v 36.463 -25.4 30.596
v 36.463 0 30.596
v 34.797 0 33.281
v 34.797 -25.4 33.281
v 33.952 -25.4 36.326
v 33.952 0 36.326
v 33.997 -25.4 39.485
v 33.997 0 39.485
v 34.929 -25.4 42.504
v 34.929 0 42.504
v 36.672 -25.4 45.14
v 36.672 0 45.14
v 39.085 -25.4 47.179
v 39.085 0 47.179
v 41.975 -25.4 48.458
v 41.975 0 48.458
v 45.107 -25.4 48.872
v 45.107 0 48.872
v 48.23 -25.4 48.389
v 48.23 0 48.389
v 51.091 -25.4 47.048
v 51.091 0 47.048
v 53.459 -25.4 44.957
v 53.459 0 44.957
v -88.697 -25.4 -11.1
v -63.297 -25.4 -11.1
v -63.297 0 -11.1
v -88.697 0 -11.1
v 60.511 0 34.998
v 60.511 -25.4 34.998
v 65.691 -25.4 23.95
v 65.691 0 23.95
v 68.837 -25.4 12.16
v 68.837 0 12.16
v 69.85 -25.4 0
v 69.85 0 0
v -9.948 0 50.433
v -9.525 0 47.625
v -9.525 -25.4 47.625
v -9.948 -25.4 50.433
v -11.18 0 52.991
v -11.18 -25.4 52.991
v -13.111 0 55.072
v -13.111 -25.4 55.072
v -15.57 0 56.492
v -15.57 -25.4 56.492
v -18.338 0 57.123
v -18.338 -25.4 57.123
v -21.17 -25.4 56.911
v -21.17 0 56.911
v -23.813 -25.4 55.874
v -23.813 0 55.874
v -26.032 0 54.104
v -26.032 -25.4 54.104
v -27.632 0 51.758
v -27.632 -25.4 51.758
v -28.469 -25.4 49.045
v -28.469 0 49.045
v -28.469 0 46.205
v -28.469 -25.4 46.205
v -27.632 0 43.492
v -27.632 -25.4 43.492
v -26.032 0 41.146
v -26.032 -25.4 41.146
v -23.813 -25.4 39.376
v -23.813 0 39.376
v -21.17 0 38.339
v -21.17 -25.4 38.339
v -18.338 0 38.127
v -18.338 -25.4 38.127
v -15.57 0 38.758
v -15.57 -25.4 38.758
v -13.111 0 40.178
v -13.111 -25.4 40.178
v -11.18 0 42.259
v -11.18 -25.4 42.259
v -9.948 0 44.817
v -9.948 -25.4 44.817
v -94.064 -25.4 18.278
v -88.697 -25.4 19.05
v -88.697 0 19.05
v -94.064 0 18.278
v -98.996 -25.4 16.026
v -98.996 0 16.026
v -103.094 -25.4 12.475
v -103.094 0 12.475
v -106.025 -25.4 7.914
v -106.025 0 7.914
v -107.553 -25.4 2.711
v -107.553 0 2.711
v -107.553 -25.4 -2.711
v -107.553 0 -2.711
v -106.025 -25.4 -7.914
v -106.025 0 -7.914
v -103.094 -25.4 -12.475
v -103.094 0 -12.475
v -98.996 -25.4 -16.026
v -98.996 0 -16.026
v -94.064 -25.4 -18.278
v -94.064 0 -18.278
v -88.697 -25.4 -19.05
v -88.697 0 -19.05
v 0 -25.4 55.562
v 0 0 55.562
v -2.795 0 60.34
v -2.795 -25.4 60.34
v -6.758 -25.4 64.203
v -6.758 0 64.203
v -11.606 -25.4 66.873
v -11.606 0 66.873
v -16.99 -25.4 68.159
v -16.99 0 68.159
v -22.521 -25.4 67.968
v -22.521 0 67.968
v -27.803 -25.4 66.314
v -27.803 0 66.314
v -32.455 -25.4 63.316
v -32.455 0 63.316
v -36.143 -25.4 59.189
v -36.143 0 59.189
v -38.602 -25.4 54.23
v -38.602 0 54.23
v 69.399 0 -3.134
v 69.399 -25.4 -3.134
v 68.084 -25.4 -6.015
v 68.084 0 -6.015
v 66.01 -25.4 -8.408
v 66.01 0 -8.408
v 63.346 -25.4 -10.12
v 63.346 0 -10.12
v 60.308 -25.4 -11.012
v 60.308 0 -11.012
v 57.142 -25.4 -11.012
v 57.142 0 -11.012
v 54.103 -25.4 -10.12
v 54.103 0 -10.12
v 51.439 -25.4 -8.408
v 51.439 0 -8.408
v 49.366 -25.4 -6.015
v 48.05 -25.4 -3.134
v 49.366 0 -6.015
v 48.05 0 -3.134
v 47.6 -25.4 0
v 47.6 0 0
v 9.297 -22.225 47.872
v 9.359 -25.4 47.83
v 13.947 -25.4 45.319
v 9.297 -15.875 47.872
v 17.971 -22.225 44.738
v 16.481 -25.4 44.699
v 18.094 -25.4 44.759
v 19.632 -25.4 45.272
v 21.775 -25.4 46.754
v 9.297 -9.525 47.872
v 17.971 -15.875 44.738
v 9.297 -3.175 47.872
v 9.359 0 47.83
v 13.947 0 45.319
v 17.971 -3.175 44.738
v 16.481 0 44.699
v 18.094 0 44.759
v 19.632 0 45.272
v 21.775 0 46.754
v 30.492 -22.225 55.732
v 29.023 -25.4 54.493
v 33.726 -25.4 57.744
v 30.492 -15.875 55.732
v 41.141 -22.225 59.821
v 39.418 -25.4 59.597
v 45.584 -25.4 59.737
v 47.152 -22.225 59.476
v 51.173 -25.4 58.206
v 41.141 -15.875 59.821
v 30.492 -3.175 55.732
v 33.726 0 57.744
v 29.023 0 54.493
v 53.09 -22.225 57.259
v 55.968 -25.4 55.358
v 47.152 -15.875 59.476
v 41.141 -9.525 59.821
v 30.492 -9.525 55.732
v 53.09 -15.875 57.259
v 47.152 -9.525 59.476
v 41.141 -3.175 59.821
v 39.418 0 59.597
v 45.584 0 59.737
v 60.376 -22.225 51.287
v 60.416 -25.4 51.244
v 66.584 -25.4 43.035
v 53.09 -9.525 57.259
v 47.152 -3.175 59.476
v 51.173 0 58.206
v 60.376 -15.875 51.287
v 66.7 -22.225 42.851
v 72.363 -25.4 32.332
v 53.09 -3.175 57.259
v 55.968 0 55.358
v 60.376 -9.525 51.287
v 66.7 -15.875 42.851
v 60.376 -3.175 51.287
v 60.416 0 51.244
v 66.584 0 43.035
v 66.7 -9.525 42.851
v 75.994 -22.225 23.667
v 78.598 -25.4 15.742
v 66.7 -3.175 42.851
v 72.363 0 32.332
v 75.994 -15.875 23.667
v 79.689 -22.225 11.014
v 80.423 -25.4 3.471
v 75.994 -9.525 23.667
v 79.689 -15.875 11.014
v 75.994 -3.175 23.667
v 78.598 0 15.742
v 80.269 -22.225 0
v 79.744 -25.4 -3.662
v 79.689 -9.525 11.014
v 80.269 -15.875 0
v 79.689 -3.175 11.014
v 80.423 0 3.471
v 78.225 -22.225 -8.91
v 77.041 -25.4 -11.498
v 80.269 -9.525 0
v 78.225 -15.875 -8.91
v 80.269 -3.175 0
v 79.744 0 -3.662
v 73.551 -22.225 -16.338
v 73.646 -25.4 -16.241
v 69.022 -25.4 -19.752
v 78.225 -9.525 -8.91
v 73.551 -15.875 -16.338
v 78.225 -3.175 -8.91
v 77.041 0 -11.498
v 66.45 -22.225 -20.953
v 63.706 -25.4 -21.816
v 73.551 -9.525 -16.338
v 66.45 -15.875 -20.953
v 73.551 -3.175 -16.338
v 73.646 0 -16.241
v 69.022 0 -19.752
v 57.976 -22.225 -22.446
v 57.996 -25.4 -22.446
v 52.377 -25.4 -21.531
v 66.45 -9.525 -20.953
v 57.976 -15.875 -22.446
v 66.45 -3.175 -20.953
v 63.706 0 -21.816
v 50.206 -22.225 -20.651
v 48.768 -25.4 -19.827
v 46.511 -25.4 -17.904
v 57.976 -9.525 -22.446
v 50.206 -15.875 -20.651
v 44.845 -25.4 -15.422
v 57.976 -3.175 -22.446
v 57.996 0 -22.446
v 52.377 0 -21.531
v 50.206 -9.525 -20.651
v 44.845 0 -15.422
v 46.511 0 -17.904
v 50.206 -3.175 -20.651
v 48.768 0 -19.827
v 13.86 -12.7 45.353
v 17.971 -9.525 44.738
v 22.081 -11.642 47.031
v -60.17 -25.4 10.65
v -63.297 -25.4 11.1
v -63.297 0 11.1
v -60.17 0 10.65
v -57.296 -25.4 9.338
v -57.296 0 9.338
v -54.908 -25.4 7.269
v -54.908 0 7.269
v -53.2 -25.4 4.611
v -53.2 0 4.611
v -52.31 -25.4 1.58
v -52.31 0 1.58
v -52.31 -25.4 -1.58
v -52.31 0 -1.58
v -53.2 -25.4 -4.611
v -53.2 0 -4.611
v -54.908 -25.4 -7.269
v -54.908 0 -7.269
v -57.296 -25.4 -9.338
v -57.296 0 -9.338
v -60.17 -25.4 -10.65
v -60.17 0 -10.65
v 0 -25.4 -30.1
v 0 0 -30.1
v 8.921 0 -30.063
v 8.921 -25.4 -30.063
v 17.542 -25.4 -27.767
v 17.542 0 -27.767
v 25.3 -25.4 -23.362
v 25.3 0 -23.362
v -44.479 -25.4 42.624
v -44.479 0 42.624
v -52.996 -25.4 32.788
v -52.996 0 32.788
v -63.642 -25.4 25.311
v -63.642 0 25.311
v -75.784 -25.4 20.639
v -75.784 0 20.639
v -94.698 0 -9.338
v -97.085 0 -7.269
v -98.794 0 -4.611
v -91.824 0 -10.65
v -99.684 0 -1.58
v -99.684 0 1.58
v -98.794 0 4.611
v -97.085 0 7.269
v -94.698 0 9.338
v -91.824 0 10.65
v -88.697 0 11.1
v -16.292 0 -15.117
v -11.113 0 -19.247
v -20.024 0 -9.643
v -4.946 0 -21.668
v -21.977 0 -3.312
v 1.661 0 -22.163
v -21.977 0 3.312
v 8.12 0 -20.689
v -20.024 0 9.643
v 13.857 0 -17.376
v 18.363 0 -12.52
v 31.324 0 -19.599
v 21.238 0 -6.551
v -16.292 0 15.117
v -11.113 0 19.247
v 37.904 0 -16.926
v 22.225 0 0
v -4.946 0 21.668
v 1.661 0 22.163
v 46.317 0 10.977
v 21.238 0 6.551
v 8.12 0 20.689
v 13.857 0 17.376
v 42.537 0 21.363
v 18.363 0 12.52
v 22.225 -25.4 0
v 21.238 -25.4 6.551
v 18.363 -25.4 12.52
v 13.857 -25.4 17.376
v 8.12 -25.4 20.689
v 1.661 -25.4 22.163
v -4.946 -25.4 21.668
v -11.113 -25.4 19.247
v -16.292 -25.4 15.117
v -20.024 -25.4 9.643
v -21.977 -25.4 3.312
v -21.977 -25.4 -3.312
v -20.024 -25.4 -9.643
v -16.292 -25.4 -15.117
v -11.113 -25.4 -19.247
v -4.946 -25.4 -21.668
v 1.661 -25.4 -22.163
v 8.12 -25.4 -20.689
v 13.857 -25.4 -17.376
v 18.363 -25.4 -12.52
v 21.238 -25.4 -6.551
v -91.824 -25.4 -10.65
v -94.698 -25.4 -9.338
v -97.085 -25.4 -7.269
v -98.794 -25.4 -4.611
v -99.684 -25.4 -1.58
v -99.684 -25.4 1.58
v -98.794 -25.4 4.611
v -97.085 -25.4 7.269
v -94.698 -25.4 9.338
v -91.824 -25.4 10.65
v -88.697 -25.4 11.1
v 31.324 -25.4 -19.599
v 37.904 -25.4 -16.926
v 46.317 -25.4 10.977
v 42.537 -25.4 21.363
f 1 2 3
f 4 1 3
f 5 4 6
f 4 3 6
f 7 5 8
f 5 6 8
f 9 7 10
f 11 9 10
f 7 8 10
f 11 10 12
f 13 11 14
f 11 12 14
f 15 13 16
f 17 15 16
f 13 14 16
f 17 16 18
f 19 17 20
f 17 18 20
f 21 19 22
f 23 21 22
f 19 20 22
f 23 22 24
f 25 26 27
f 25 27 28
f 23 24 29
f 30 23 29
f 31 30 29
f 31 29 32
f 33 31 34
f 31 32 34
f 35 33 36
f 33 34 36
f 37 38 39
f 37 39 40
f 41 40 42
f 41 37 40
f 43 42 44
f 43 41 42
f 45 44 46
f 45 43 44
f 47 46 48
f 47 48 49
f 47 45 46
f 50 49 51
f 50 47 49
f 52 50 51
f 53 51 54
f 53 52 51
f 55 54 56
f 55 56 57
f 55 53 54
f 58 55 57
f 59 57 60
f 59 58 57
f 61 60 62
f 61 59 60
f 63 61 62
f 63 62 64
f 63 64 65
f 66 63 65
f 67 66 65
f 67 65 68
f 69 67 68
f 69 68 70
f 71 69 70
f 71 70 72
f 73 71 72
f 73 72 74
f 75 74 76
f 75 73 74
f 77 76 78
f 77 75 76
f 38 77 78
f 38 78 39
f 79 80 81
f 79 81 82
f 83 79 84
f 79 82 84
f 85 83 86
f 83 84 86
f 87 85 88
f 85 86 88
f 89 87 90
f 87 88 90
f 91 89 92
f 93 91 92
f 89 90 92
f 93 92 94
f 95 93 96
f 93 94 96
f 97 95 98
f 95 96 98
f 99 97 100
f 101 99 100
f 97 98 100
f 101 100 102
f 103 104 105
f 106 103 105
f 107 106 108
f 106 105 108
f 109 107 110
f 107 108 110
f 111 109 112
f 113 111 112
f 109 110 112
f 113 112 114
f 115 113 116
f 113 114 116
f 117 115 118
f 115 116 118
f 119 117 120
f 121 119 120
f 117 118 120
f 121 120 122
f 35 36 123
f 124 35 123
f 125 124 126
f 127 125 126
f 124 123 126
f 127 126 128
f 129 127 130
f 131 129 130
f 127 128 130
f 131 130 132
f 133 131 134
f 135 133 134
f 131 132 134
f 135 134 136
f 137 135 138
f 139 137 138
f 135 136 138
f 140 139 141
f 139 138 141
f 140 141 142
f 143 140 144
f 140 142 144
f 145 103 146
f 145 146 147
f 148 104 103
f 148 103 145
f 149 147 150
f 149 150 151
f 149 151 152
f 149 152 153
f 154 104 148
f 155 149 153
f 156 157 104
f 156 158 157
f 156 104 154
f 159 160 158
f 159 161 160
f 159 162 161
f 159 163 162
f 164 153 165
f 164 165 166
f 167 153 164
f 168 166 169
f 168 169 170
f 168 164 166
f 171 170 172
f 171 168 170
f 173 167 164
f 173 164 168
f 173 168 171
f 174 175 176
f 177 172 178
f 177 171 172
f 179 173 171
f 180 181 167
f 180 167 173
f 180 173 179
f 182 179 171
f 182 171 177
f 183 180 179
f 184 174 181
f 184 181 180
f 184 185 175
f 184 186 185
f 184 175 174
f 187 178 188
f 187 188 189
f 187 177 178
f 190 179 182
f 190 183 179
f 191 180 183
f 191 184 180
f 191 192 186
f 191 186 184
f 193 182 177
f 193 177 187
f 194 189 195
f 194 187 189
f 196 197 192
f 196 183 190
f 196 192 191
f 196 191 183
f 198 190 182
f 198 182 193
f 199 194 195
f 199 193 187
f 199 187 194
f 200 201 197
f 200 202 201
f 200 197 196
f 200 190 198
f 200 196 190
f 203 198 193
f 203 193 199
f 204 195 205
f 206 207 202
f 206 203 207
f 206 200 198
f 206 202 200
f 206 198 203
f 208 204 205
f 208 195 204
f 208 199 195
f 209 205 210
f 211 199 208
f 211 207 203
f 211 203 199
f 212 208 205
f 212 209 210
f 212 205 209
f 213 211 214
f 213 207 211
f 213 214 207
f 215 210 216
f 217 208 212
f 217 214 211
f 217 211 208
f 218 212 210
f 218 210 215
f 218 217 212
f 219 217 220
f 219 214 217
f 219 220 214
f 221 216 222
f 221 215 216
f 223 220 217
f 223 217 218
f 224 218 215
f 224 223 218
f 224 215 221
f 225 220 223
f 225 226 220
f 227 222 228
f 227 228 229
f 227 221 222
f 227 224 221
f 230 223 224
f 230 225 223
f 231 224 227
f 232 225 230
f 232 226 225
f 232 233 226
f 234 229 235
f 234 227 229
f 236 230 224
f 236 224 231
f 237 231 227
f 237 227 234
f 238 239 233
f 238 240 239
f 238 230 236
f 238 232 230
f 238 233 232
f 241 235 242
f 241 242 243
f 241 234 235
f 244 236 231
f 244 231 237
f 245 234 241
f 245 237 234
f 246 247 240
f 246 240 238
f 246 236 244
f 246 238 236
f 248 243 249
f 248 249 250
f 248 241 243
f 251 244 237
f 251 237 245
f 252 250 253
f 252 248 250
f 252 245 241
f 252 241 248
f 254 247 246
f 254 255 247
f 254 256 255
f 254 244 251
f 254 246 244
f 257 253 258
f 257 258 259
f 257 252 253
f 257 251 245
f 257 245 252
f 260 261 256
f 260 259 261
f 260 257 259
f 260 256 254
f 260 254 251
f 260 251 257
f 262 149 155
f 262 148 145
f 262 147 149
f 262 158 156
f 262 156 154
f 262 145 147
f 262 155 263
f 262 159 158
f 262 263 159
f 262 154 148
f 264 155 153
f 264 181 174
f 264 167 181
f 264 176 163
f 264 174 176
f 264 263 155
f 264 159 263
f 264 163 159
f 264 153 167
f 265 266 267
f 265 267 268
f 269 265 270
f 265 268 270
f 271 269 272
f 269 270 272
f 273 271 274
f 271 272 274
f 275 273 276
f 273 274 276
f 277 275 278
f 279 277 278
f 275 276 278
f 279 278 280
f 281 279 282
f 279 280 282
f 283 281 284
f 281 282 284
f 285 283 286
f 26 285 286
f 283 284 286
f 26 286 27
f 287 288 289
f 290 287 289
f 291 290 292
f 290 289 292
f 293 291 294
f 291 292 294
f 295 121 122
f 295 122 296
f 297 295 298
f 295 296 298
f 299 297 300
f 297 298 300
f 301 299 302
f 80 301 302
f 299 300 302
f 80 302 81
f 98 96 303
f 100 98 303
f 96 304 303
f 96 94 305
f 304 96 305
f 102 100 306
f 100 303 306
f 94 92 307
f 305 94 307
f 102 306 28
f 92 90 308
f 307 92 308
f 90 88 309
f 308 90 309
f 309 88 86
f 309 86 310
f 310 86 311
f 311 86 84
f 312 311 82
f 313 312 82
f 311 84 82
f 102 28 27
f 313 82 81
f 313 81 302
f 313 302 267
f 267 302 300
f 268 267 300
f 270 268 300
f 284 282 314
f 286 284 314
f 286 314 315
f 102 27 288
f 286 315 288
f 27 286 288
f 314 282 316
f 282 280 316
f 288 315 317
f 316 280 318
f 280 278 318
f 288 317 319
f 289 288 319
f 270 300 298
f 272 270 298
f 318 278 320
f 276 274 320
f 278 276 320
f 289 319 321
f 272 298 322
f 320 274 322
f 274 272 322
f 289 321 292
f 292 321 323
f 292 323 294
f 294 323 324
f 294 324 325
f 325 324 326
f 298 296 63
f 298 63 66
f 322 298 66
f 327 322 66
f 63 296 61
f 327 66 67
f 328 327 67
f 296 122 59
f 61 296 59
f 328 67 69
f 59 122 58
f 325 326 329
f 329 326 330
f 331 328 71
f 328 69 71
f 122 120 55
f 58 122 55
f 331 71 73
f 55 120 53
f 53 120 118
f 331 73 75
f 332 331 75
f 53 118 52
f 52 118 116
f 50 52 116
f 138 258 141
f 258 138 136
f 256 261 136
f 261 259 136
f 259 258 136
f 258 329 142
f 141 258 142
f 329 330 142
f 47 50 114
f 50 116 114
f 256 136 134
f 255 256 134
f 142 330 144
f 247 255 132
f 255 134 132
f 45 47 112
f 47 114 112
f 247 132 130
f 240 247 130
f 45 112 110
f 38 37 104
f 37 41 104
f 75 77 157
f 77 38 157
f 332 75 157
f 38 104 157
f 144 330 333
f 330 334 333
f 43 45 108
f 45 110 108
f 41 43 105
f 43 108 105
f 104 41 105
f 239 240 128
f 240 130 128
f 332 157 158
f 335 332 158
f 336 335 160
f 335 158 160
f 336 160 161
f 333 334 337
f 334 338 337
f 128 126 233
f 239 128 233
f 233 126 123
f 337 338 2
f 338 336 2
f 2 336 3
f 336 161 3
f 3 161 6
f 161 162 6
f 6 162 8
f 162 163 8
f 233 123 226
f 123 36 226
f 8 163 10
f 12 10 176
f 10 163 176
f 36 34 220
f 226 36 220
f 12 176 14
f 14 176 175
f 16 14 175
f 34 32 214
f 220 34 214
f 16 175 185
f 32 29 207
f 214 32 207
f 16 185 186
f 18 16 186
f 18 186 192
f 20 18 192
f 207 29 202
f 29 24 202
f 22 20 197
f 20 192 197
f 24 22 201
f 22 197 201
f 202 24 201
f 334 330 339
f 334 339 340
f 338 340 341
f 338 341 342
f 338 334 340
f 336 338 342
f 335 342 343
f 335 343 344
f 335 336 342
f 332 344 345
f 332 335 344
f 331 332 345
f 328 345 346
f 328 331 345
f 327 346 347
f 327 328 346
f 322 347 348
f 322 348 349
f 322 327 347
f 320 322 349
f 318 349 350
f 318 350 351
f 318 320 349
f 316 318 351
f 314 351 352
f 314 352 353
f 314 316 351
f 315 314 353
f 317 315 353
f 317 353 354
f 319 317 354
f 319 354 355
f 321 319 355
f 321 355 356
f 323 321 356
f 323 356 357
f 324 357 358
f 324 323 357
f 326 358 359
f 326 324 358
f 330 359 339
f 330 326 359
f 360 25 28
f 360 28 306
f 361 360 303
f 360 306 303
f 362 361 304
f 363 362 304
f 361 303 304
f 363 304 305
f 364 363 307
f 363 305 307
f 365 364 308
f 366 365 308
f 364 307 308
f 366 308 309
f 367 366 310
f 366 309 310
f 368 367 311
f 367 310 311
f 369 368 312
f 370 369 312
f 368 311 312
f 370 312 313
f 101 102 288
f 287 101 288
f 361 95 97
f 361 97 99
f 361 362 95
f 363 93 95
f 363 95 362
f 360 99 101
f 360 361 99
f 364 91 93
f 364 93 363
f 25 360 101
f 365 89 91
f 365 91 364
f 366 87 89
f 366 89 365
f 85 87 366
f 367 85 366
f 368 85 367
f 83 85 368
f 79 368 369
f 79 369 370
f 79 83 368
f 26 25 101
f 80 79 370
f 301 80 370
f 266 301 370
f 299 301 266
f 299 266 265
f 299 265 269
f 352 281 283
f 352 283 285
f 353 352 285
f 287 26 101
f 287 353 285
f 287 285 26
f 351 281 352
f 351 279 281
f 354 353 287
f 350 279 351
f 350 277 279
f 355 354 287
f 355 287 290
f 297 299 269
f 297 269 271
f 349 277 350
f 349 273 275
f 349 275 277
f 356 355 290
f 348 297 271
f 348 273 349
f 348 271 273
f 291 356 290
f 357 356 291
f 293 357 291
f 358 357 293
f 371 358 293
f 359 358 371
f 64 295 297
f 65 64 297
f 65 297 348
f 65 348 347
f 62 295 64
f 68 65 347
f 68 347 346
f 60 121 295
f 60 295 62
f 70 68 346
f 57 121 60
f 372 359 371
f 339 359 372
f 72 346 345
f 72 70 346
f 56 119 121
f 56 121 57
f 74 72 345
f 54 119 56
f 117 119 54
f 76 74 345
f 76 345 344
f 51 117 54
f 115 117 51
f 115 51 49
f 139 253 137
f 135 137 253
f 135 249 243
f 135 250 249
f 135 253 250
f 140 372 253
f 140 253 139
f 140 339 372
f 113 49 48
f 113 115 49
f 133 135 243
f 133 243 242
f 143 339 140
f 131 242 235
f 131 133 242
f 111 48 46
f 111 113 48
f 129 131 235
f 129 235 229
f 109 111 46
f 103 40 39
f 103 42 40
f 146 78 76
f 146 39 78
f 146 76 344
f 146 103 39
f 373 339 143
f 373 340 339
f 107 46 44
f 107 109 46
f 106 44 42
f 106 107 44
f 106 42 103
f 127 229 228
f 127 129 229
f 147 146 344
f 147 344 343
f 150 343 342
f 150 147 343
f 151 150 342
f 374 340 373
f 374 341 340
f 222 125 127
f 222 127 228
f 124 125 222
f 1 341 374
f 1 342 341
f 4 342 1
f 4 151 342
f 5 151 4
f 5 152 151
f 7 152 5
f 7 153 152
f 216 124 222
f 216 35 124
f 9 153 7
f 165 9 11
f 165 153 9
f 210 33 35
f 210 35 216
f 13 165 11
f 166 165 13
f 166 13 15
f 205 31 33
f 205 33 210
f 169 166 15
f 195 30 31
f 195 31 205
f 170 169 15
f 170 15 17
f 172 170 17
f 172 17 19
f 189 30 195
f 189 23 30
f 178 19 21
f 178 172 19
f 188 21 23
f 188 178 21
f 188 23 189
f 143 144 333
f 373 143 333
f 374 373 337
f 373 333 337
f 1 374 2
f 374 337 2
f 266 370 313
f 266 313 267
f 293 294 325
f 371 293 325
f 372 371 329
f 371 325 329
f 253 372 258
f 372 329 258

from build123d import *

# Parameters (mm, degrees)
F0_R     = 9.525
F0_R_2   = 22.225
F1_DEPTH = 25.4


with BuildPart() as f1:
    # F0 (on Front) → F1 (new body)
    with BuildSketch(Plane.XZ):
        with BuildLine():
            ThreePointArc((-38.6019731115, 54.2300551624), (-22.396831424, 27.2606899044), (1.5875, 47.625))
            ThreePointArc((1.5875, 47.625), (1.1867336946, 51.6723467389), (0, 55.5625))
            ThreePointArc((0, 55.5625), (-19.7619315715, 68.2502165973), (-38.6019731115, 54.2300551624))
        make_face()
        with Locations((-19.05, 47.625)):
            Circle(F0_R, mode=Mode.SUBTRACT)
        with BuildLine():
            ThreePointArc((0, 55.5625), (1.1867336946, 51.6723467389), (1.5875, 47.625))
            ThreePointArc((1.5875, 47.625), (-22.396831424, 27.2606899044), (-38.6019731115, 54.2300551624))
            ThreePointArc((-38.6019731115, 54.2300551624), (-58.0899055062, 28.7235749355), (-88.6968, 19.05))
            Line((-88.6968, 19.05), (-63.2968, 19.05))
            ThreePointArc((-63.2968, 19.05), (-44.2468, 0), (-63.2968, -19.05))
            Line((-63.2968, -19.05), (-88.6968, -19.05))
            Line((-88.6968, -19.05), (0, -30.0997427003))
            ThreePointArc((0, -30.0997427003), (13.3055232241, -29.1913004245), (25.3004375845, -23.3616996557))
            ThreePointArc((25.3004375845, -23.3616996557), (34.556419149, -18.121015748), (44.8448620737, -15.4217742383))
            add(Edge.make_bspline(
                [(0, 55.5625), (5.8780273416, 50.2801245956), (19.2026785126, 38.301419748), (28.7757522314, 59.2322407386), (57.387469548, 63.2305309097), (77.6342462092, 23.706494508), (82.1484389365, 0.9679475703), (75.5829510629, -18.1051792077), (58.2641102959, -24.6551147398), (47.0923191994, -20.1232447624), (44.8448620737, -15.4217742383)],
                knots=[0, 0, 0, 0, 0.1242826422, 0.2350424379, 0.3641785745, 0.537193634, 0.6702619569, 0.784307144, 0.8952894715, 1, 1, 1, 1], degree=3))
        make_face()
        Circle(F0_R_2, mode=Mode.SUBTRACT)
        with BuildLine():
            ThreePointArc((69.85, 0), (58.7248, -11.1252), (47.5996, 0))
            ThreePointArc((47.5996, 0), (44.7289928724, 16.2800220142), (36.4634090747, 30.596433106))
            ThreePointArc((36.4634090747, 30.596433106), (37.8056832531, 46.245567828), (53.4592985247, 44.9565967483))
            ThreePointArc((53.4592985247, 44.9565967483), (65.6908180691, 23.9498429927), (69.85, 0))
        make_face(mode=Mode.SUBTRACT)
        with BuildLine():
            Line((-63.2968, 19.05), (-88.6968, 19.05))
            ThreePointArc((-88.6968, 19.05), (-107.7468, 0), (-88.6968, -19.05))
            Line((-88.6968, -19.05), (-63.2968, -19.05))
            ThreePointArc((-63.2968, -19.05), (-44.2468, 0), (-63.2968, 19.05))
        make_face()
        with BuildLine():
            Line((-88.6968, 11.0998), (-63.2968, 11.0998))
            ThreePointArc((-63.2968, 11.0998), (-52.197, 0), (-63.2968, -11.0998))
            Line((-63.2968, -11.0998), (-88.6968, -11.0998))
            ThreePointArc((-88.6968, -11.0998), (-99.7966, 0), (-88.6968, 11.0998))
        make_face(mode=Mode.SUBTRACT)
    extrude(amount=F1_DEPTH)


solid = f1.part
